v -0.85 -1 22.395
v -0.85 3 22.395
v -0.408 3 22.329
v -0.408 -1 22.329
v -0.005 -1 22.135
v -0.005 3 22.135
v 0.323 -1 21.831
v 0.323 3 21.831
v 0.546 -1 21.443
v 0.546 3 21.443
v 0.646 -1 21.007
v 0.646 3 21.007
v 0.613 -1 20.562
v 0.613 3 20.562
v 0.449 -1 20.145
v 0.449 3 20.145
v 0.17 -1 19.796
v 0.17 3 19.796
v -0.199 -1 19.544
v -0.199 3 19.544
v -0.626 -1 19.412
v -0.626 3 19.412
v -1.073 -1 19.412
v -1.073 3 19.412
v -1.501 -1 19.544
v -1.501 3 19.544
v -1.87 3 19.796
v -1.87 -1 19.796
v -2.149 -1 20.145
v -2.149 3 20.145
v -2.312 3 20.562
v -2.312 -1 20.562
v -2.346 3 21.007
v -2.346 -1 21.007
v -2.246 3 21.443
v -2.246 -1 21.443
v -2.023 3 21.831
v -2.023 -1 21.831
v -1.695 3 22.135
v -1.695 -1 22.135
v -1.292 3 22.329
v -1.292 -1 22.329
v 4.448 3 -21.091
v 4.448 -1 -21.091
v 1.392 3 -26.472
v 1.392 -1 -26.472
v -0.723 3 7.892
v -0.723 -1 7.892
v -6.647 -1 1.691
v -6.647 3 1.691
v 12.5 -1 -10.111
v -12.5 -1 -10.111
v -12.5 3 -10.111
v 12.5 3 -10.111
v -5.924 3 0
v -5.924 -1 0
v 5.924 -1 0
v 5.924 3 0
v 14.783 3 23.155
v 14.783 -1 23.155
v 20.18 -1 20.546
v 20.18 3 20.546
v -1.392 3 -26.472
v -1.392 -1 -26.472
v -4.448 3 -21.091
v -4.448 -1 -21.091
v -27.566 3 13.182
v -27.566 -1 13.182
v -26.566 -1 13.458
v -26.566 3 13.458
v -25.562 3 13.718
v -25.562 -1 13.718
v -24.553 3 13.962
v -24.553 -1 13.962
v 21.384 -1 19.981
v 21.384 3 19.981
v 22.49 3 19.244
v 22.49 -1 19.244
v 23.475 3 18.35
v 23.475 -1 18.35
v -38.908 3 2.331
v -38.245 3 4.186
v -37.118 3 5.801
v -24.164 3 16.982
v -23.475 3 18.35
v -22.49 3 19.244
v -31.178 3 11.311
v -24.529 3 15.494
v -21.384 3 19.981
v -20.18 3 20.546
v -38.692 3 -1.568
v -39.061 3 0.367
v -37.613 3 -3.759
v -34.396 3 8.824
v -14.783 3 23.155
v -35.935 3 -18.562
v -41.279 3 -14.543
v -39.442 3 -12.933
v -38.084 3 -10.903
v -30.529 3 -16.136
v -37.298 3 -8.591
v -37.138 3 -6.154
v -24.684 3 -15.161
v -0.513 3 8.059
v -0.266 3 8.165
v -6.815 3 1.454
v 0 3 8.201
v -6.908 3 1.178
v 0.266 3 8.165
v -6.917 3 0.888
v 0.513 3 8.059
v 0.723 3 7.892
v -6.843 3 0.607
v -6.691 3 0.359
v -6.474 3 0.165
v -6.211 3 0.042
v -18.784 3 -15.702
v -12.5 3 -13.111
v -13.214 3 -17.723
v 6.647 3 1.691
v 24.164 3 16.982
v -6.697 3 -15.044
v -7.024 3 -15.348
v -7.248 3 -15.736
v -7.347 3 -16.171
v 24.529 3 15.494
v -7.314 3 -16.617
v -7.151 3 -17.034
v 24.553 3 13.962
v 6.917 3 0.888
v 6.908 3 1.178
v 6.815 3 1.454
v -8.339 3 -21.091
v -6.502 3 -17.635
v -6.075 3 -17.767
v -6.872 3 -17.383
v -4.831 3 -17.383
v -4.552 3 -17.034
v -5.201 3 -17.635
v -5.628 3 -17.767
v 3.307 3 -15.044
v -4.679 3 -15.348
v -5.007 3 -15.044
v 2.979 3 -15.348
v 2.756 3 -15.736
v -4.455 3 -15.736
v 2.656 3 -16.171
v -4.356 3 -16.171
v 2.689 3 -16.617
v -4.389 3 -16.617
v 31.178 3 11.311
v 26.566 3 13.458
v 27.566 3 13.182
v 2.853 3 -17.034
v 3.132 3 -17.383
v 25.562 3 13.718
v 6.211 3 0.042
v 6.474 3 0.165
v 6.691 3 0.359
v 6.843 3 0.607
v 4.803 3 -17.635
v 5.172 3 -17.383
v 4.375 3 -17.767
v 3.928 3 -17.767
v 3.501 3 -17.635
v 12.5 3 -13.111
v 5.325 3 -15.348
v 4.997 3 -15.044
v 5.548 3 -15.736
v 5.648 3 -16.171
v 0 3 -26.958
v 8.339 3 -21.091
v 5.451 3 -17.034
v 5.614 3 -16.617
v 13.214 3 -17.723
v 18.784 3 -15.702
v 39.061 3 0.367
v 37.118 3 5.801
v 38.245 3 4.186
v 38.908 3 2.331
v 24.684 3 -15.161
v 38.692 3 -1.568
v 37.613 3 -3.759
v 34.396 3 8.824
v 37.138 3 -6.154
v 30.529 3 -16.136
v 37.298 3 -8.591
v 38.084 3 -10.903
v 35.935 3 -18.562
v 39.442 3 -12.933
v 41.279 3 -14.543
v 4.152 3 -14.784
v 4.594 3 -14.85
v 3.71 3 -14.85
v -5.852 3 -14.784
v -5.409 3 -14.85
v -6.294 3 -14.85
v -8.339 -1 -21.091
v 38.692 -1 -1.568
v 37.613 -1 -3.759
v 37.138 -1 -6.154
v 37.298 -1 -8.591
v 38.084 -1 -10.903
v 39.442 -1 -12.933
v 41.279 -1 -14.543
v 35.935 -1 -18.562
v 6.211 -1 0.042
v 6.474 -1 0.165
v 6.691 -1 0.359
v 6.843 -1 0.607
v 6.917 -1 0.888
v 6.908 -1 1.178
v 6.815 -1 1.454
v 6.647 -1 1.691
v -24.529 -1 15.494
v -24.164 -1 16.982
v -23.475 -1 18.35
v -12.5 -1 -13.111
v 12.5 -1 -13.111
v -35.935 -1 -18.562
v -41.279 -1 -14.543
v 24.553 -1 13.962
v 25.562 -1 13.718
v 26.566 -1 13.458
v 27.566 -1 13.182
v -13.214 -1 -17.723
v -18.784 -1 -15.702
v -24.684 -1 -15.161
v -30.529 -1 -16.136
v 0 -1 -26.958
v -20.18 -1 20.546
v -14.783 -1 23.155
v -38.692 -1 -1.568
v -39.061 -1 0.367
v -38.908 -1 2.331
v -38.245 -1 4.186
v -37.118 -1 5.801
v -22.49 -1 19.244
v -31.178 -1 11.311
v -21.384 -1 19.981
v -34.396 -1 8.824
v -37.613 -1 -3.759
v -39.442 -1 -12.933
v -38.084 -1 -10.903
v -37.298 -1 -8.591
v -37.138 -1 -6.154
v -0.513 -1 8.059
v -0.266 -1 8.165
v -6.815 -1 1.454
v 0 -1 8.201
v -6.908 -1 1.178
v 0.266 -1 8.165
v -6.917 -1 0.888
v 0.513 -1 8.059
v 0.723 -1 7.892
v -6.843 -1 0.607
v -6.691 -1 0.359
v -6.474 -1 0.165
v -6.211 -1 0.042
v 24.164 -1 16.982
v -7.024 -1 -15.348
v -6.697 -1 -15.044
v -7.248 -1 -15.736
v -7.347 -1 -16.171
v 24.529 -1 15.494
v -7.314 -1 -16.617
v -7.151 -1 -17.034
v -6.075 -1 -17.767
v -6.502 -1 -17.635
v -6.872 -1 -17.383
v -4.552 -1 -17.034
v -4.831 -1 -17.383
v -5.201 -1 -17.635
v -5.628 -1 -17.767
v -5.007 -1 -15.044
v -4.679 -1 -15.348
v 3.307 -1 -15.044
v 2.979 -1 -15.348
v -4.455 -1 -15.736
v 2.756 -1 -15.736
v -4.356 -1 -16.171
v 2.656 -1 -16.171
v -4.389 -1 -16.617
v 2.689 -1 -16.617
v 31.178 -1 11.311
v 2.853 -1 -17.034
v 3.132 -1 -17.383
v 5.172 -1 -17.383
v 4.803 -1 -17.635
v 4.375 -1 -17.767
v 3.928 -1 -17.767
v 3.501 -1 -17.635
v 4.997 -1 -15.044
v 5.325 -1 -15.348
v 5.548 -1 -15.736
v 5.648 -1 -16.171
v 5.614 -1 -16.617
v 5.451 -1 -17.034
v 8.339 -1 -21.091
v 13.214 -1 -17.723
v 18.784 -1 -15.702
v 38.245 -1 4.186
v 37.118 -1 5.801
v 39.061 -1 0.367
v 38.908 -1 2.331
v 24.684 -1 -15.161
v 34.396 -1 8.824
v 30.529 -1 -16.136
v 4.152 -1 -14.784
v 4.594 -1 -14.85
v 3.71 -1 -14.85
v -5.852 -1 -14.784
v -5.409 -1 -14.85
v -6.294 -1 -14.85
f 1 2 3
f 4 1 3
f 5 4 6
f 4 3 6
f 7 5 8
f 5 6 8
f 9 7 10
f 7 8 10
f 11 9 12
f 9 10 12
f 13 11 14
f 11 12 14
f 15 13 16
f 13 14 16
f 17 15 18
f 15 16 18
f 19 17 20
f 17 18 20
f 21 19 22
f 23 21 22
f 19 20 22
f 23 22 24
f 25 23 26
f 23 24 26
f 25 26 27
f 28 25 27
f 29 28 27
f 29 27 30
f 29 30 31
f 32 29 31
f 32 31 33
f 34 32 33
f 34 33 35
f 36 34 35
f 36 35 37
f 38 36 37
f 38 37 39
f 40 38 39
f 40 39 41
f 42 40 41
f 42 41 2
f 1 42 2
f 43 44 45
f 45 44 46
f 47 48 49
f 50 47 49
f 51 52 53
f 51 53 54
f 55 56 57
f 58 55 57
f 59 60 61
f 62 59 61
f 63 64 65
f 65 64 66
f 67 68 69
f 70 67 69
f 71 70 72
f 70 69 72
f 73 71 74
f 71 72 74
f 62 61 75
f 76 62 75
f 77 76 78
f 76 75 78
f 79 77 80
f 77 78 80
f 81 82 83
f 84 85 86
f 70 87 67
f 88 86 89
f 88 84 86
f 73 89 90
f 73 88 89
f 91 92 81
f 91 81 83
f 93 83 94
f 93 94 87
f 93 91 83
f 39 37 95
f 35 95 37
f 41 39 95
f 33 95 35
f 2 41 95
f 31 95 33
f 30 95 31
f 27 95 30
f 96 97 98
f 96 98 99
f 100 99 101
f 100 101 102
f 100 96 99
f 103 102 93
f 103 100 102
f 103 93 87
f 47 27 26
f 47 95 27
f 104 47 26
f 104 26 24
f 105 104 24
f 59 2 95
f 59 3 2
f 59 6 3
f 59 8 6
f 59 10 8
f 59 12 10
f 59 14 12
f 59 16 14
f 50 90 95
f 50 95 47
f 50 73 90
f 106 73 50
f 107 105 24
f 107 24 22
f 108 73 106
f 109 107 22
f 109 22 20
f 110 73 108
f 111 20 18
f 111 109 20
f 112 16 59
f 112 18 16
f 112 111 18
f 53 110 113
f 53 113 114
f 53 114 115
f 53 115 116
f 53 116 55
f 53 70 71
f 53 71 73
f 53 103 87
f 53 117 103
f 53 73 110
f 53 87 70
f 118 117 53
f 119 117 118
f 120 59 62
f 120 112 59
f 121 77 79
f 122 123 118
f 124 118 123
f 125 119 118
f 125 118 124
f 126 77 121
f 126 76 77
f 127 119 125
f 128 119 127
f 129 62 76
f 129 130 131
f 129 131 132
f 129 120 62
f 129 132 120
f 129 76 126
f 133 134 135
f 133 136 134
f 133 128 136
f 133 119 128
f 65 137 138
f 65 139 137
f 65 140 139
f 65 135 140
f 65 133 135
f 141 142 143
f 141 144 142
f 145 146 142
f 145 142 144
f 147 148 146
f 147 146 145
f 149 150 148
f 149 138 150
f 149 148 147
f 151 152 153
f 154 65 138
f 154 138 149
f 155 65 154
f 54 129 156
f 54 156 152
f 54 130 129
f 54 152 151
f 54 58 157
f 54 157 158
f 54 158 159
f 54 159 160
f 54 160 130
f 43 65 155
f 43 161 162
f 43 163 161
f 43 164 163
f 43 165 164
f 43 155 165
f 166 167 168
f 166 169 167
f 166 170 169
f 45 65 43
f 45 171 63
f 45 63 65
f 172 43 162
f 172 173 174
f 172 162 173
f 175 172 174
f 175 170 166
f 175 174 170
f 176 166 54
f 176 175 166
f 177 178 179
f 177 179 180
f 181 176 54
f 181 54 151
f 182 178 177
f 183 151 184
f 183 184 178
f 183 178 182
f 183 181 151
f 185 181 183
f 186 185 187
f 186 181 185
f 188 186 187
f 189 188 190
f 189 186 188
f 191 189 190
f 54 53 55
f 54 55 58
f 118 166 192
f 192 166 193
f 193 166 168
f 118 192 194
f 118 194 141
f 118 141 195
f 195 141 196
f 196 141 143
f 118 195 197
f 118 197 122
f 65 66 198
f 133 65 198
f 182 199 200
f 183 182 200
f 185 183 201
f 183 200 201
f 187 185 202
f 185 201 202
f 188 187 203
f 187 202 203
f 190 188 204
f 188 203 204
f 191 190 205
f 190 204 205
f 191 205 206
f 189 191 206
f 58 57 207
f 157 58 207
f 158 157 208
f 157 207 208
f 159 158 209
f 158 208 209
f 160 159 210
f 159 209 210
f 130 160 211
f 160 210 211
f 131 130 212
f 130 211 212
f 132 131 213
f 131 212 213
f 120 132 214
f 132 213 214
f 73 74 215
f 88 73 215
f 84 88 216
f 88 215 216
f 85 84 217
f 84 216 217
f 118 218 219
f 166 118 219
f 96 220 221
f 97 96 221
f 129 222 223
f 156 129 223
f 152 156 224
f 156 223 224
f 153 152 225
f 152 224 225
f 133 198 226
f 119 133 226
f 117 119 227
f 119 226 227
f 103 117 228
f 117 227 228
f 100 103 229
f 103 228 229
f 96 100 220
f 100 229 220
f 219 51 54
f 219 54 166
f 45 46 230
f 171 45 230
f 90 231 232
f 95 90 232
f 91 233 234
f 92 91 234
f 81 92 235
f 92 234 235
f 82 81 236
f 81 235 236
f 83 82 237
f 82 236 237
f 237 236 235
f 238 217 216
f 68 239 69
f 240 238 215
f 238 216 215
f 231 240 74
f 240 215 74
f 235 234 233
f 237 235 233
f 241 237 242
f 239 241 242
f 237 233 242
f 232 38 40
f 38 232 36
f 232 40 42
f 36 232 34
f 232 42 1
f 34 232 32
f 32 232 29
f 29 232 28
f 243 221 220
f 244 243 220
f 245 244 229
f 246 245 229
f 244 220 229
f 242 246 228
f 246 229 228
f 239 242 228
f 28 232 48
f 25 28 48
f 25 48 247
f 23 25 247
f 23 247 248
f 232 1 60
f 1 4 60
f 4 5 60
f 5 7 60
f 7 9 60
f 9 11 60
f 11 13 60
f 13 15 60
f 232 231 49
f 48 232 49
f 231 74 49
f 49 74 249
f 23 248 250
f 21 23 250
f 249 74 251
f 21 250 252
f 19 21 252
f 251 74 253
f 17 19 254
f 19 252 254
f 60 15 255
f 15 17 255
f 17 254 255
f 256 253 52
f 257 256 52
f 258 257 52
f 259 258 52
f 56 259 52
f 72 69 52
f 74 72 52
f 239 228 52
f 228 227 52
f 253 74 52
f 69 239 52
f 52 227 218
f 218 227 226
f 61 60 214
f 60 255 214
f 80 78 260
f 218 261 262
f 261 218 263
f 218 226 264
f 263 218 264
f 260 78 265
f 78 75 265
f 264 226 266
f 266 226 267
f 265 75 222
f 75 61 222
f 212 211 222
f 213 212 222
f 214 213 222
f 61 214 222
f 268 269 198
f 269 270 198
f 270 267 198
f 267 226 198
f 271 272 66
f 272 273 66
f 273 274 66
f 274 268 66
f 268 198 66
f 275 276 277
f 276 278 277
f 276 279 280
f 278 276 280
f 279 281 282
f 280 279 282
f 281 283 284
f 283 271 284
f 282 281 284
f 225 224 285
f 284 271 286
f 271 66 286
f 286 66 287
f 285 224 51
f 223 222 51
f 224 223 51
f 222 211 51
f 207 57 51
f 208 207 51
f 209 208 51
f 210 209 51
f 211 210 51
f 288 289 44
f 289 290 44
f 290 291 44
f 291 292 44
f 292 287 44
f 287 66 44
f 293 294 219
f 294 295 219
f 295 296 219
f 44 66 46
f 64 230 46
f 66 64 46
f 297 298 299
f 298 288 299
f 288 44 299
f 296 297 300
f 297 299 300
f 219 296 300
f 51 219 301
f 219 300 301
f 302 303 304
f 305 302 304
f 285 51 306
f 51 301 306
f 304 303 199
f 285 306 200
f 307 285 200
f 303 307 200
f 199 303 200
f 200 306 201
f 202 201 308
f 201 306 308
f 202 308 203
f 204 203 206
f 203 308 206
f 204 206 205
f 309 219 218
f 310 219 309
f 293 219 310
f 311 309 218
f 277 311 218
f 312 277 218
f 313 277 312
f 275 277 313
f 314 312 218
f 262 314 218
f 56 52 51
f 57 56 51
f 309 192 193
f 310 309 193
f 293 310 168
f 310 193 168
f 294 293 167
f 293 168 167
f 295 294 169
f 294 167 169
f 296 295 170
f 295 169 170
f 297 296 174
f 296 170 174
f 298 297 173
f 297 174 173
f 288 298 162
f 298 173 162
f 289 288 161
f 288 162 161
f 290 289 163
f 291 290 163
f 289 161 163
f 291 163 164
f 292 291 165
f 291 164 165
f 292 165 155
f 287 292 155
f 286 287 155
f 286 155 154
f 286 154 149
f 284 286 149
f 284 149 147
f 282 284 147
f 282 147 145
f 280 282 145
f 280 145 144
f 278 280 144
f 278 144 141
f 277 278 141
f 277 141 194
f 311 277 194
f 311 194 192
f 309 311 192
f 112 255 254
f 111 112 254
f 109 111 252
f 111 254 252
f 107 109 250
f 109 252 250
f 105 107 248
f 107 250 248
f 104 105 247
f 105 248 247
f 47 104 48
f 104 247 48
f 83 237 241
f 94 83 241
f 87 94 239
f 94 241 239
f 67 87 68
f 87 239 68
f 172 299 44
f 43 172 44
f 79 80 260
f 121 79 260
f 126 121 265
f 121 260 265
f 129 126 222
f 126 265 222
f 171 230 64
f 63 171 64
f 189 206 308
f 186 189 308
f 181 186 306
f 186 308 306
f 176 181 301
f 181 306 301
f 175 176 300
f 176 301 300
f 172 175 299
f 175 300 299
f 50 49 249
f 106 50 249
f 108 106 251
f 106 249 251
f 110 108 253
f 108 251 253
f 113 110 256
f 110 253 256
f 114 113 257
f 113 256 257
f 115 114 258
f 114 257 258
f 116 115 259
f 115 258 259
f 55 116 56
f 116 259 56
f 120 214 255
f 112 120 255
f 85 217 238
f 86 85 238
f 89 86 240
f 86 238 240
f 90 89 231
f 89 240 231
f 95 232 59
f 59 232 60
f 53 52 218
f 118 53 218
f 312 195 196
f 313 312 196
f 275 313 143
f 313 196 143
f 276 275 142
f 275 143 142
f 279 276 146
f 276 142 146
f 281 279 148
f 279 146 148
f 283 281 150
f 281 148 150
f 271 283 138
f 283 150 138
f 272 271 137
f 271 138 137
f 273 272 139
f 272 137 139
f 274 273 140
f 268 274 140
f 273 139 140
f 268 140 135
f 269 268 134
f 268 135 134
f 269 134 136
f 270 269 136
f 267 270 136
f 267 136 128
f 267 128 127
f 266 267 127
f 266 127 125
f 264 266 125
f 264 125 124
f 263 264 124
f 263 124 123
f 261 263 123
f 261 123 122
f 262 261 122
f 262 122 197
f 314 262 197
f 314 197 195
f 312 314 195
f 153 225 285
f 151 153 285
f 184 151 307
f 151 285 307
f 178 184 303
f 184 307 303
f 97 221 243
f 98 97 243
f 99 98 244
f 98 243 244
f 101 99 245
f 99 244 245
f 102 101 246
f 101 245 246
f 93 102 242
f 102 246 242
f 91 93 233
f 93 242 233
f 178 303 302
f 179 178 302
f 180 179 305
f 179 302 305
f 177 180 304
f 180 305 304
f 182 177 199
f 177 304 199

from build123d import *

# Parameters (mm, degrees)
BOSS_EXTRUDE1_DEPTH     = 2
SCALE1_SCALE            = 2
SKETCH6_R               = 1.5
CUT_EXTRUDE2_DEPTH      = 50.464206186
SKETCH7_W               = 25
SKETCH7_H               = 3
BOSS_EXTRUDE2_DEPTH     = 15
SKETCH8_R               = 1.5
SKETCH8_W               = 16
SKETCH8_H               = 11
CUT_EXTRUDE3_DEPTH      = 18
FILLET3_R               = 3
FILLET4_R               = 3
SKETCH10_R              = 1.5
CUT_EXTRUDE4_DEPTH      = 10
CUT_EXTRUDE5_DEPTH      = 52.533558907
CUT_EXTRUDE5_DEPTH_BACK = 52.533558907
SKETCH11_W              = 25
SKETCH11_H              = 3
CUT_EXTRUDE6_DEPTH      = 50.464206186
CUT_EXTRUDE6_DEPTH_BACK = 50.464206186


with BuildPart() as part:
    # Sketch2 → Boss-Extrude1 (new body)
    with BuildSketch(Plane(origin=(0, 0, 0), x_dir=(1, 0, 0), z_dir=(0, 1, 0))):
        with BuildLine():
            Line((-17.967387551, 9.159795774), (-20.639475337, 7.15016677))
            ThreePointArc((-20.639475337, 7.15016677), (-18.649238809, 4.17439457), (-19.346117765, 0.662896123))
            ThreePointArc((-19.346117765, 0.662896123), (-19.45411943, -1.286546543), (-18.558961711, -3.021678736))
            ThreePointArc((-18.558961711, -3.021678736), (-16.421478173, -5.190969631), (-13.78312899, -6.712078584))
            ThreePointArc((-13.78312899, -6.712078584), (-13.032173848, -6.916004841), (-12.276686285, -7.102440046))
            ThreePointArc((-12.276686285, -7.102440046), (-12.194265553, -8.245293076), (-11.737308023, -9.296052821))
            ThreePointArc((-11.737308023, -9.296052821), (-10.975506649, -9.937799505), (-10.090124565, -10.394175126))
            Line((-10.090124565, -10.394175126), (-7.391598262, -11.698651137))
            Line((-7.391598262, -11.698651137), (7.391598262, -11.698651137))
            Line((7.391598262, -11.698651137), (10.090124565, -10.394175126))
            ThreePointArc((10.090124565, -10.394175126), (10.975506649, -9.937799505), (11.737308023, -9.296052821))
            ThreePointArc((11.737308023, -9.296052821), (12.194265553, -8.245293076), (12.276686285, -7.102440046))
            ThreePointArc((12.276686285, -7.102440046), (13.032173848, -6.916004841), (13.78312899, -6.712078584))
            ThreePointArc((13.78312899, -6.712078584), (16.421478173, -5.190969631), (18.558961711, -3.021678736))
            ThreePointArc((18.558961711, -3.021678736), (19.45411943, -1.286546543), (19.346117765, 0.662896123))
            ThreePointArc((19.346117765, 0.662896123), (18.649238809, 4.17439457), (20.639475337, 7.15016677))
            Line((20.639475337, 7.15016677), (17.967387551, 9.159795774))
            ThreePointArc((17.967387551, 9.159795774), (10.858325227, 7.499674132), (4.169484372, 10.424426945))
            Line((4.169484372, 10.424426945), (2.224138848, 10.424426945))
            Line((2.224138848, 10.424426945), (0.696104526, 13.114793475))
            Line((0.696104526, 13.114793475), (0, 13.358013588))
            Line((0, 13.358013588), (-0.696104526, 13.114793475))
            Line((-0.696104526, 13.114793475), (-2.224138848, 10.424426945))
            Line((-2.224138848, 10.424426945), (-4.169484372, 10.424426945))
            ThreePointArc((-4.169484372, 10.424426945), (-10.858325227, 7.499674132), (-17.967387551, 9.159795774))
        make_face()
    extrude(amount=BOSS_EXTRUDE1_DEPTH)


with BuildPart() as part_1:
    # Scale1: scaled about (0, 1, 0.242383844)
    add(part.part.scale(SCALE1_SCALE).moved(Location((0, -1, -0.242383844))))

    # Sketch6 → Cut-Extrude2 (cut, through all)
    with BuildSketch(Plane(origin=(0, 3, 0), x_dir=(1, 0, 0), z_dir=(0, 1, 0))):
        with Locations(Location((-5.851533015, 16.28357055, 0), (0, 0, 270))):
            Circle(SKETCH6_R)
        with Locations(Location((4.151829214, 16.28357055, 0), (0, 0, 270))):
            Circle(SKETCH6_R)
    extrude(amount=-CUT_EXTRUDE2_DEPTH, mode=Mode.SUBTRACT)

    # Sketch7 → Boss-Extrude2 (add)
    with BuildSketch(Plane(origin=(0, 3, 0), x_dir=(1, 0, 0), z_dir=(0, 1, 0))):
        with Locations((0, 11.610861671)):
            Rectangle(SKETCH7_W, SKETCH7_H)
    extrude(amount=BOSS_EXTRUDE2_DEPTH)

    # Sketch8 → Cut-Extrude3 (cut)
    with BuildSketch(Plane.XY.offset(-10.110861671)):
        with Locations((-9.75, 10.917386914)):
            Circle(SKETCH8_R)
        with Locations((9.75, 10.917386914)):
            Circle(SKETCH8_R)
        with Locations((0, 10.917386914)):
            Rectangle(SKETCH8_W, SKETCH8_H)
    extrude(amount=-CUT_EXTRUDE3_DEPTH, mode=Mode.SUBTRACT)

    # Fillet3
    fillet3_edges = [part_1.edges().sort_by_distance(p)[0] for p in [
        (-12.5, 18, -11.610861671),
    ]]
    fillet(fillet3_edges, radius=FILLET3_R)

    # Fillet4
    fillet4_edges = [part_1.edges().sort_by_distance(p)[0] for p in [
        (12.5, 18, -11.610861671),
    ]]
    fillet(fillet4_edges, radius=FILLET4_R)

    # Sketch10 → Cut-Extrude4 (cut)
    with BuildSketch(Plane(origin=(0, 3, 0), x_dir=(1, 0, 0), z_dir=(0, 1, 0))):
        with Locations(Location((-0.8498519, -20.895328087, 0), (0, 0, 270))):
            Circle(SKETCH10_R)
    extrude(amount=-CUT_EXTRUDE4_DEPTH, mode=Mode.SUBTRACT)

    # Sketch11 → Cut-Extrude5 (cut, two sides: drawn at the far end of the back side and taken through both)
    with BuildSketch(Plane(origin=(0, 3, 0), x_dir=(1, 0, 0), z_dir=(0, 1, 0)).offset(-CUT_EXTRUDE5_DEPTH_BACK)):
        with Locations((0, 11.610861671)):
            Rectangle(SKETCH11_W, SKETCH11_H)
    extrude(amount=CUT_EXTRUDE5_DEPTH + CUT_EXTRUDE5_DEPTH_BACK, mode=Mode.SUBTRACT)

    # Sketch12 → Cut-Extrude6 (cut, two sides: drawn at the far end of the back side and taken through both)
    with BuildSketch(Plane(origin=(0, 3, 0), x_dir=(1, 0, 0), z_dir=(0, 1, 0)).offset(-CUT_EXTRUDE6_DEPTH_BACK)):
        with BuildLine():
            Line((-5.923543235, 0), (5.923543235, 0))
            ThreePointArc((5.923543235, 0), (6.842985975, -0.606776086), (6.646636982, -1.690749907))
            Line((6.646636982, -1.690749907), (0.723093747, -7.891658559))
            ThreePointArc((0.723093747, -7.891658559), (0, -8.200908652), (-0.723093747, -7.891658559))
            Line((-0.723093747, -7.891658559), (-6.646636982, -1.690749907))
            ThreePointArc((-6.646636982, -1.690749907), (-6.842985975, -0.606776086), (-5.923543235, 0))
        make_face()
    extrude(amount=CUT_EXTRUDE6_DEPTH + CUT_EXTRUDE6_DEPTH_BACK, mode=Mode.SUBTRACT)


solid = part_1.part
